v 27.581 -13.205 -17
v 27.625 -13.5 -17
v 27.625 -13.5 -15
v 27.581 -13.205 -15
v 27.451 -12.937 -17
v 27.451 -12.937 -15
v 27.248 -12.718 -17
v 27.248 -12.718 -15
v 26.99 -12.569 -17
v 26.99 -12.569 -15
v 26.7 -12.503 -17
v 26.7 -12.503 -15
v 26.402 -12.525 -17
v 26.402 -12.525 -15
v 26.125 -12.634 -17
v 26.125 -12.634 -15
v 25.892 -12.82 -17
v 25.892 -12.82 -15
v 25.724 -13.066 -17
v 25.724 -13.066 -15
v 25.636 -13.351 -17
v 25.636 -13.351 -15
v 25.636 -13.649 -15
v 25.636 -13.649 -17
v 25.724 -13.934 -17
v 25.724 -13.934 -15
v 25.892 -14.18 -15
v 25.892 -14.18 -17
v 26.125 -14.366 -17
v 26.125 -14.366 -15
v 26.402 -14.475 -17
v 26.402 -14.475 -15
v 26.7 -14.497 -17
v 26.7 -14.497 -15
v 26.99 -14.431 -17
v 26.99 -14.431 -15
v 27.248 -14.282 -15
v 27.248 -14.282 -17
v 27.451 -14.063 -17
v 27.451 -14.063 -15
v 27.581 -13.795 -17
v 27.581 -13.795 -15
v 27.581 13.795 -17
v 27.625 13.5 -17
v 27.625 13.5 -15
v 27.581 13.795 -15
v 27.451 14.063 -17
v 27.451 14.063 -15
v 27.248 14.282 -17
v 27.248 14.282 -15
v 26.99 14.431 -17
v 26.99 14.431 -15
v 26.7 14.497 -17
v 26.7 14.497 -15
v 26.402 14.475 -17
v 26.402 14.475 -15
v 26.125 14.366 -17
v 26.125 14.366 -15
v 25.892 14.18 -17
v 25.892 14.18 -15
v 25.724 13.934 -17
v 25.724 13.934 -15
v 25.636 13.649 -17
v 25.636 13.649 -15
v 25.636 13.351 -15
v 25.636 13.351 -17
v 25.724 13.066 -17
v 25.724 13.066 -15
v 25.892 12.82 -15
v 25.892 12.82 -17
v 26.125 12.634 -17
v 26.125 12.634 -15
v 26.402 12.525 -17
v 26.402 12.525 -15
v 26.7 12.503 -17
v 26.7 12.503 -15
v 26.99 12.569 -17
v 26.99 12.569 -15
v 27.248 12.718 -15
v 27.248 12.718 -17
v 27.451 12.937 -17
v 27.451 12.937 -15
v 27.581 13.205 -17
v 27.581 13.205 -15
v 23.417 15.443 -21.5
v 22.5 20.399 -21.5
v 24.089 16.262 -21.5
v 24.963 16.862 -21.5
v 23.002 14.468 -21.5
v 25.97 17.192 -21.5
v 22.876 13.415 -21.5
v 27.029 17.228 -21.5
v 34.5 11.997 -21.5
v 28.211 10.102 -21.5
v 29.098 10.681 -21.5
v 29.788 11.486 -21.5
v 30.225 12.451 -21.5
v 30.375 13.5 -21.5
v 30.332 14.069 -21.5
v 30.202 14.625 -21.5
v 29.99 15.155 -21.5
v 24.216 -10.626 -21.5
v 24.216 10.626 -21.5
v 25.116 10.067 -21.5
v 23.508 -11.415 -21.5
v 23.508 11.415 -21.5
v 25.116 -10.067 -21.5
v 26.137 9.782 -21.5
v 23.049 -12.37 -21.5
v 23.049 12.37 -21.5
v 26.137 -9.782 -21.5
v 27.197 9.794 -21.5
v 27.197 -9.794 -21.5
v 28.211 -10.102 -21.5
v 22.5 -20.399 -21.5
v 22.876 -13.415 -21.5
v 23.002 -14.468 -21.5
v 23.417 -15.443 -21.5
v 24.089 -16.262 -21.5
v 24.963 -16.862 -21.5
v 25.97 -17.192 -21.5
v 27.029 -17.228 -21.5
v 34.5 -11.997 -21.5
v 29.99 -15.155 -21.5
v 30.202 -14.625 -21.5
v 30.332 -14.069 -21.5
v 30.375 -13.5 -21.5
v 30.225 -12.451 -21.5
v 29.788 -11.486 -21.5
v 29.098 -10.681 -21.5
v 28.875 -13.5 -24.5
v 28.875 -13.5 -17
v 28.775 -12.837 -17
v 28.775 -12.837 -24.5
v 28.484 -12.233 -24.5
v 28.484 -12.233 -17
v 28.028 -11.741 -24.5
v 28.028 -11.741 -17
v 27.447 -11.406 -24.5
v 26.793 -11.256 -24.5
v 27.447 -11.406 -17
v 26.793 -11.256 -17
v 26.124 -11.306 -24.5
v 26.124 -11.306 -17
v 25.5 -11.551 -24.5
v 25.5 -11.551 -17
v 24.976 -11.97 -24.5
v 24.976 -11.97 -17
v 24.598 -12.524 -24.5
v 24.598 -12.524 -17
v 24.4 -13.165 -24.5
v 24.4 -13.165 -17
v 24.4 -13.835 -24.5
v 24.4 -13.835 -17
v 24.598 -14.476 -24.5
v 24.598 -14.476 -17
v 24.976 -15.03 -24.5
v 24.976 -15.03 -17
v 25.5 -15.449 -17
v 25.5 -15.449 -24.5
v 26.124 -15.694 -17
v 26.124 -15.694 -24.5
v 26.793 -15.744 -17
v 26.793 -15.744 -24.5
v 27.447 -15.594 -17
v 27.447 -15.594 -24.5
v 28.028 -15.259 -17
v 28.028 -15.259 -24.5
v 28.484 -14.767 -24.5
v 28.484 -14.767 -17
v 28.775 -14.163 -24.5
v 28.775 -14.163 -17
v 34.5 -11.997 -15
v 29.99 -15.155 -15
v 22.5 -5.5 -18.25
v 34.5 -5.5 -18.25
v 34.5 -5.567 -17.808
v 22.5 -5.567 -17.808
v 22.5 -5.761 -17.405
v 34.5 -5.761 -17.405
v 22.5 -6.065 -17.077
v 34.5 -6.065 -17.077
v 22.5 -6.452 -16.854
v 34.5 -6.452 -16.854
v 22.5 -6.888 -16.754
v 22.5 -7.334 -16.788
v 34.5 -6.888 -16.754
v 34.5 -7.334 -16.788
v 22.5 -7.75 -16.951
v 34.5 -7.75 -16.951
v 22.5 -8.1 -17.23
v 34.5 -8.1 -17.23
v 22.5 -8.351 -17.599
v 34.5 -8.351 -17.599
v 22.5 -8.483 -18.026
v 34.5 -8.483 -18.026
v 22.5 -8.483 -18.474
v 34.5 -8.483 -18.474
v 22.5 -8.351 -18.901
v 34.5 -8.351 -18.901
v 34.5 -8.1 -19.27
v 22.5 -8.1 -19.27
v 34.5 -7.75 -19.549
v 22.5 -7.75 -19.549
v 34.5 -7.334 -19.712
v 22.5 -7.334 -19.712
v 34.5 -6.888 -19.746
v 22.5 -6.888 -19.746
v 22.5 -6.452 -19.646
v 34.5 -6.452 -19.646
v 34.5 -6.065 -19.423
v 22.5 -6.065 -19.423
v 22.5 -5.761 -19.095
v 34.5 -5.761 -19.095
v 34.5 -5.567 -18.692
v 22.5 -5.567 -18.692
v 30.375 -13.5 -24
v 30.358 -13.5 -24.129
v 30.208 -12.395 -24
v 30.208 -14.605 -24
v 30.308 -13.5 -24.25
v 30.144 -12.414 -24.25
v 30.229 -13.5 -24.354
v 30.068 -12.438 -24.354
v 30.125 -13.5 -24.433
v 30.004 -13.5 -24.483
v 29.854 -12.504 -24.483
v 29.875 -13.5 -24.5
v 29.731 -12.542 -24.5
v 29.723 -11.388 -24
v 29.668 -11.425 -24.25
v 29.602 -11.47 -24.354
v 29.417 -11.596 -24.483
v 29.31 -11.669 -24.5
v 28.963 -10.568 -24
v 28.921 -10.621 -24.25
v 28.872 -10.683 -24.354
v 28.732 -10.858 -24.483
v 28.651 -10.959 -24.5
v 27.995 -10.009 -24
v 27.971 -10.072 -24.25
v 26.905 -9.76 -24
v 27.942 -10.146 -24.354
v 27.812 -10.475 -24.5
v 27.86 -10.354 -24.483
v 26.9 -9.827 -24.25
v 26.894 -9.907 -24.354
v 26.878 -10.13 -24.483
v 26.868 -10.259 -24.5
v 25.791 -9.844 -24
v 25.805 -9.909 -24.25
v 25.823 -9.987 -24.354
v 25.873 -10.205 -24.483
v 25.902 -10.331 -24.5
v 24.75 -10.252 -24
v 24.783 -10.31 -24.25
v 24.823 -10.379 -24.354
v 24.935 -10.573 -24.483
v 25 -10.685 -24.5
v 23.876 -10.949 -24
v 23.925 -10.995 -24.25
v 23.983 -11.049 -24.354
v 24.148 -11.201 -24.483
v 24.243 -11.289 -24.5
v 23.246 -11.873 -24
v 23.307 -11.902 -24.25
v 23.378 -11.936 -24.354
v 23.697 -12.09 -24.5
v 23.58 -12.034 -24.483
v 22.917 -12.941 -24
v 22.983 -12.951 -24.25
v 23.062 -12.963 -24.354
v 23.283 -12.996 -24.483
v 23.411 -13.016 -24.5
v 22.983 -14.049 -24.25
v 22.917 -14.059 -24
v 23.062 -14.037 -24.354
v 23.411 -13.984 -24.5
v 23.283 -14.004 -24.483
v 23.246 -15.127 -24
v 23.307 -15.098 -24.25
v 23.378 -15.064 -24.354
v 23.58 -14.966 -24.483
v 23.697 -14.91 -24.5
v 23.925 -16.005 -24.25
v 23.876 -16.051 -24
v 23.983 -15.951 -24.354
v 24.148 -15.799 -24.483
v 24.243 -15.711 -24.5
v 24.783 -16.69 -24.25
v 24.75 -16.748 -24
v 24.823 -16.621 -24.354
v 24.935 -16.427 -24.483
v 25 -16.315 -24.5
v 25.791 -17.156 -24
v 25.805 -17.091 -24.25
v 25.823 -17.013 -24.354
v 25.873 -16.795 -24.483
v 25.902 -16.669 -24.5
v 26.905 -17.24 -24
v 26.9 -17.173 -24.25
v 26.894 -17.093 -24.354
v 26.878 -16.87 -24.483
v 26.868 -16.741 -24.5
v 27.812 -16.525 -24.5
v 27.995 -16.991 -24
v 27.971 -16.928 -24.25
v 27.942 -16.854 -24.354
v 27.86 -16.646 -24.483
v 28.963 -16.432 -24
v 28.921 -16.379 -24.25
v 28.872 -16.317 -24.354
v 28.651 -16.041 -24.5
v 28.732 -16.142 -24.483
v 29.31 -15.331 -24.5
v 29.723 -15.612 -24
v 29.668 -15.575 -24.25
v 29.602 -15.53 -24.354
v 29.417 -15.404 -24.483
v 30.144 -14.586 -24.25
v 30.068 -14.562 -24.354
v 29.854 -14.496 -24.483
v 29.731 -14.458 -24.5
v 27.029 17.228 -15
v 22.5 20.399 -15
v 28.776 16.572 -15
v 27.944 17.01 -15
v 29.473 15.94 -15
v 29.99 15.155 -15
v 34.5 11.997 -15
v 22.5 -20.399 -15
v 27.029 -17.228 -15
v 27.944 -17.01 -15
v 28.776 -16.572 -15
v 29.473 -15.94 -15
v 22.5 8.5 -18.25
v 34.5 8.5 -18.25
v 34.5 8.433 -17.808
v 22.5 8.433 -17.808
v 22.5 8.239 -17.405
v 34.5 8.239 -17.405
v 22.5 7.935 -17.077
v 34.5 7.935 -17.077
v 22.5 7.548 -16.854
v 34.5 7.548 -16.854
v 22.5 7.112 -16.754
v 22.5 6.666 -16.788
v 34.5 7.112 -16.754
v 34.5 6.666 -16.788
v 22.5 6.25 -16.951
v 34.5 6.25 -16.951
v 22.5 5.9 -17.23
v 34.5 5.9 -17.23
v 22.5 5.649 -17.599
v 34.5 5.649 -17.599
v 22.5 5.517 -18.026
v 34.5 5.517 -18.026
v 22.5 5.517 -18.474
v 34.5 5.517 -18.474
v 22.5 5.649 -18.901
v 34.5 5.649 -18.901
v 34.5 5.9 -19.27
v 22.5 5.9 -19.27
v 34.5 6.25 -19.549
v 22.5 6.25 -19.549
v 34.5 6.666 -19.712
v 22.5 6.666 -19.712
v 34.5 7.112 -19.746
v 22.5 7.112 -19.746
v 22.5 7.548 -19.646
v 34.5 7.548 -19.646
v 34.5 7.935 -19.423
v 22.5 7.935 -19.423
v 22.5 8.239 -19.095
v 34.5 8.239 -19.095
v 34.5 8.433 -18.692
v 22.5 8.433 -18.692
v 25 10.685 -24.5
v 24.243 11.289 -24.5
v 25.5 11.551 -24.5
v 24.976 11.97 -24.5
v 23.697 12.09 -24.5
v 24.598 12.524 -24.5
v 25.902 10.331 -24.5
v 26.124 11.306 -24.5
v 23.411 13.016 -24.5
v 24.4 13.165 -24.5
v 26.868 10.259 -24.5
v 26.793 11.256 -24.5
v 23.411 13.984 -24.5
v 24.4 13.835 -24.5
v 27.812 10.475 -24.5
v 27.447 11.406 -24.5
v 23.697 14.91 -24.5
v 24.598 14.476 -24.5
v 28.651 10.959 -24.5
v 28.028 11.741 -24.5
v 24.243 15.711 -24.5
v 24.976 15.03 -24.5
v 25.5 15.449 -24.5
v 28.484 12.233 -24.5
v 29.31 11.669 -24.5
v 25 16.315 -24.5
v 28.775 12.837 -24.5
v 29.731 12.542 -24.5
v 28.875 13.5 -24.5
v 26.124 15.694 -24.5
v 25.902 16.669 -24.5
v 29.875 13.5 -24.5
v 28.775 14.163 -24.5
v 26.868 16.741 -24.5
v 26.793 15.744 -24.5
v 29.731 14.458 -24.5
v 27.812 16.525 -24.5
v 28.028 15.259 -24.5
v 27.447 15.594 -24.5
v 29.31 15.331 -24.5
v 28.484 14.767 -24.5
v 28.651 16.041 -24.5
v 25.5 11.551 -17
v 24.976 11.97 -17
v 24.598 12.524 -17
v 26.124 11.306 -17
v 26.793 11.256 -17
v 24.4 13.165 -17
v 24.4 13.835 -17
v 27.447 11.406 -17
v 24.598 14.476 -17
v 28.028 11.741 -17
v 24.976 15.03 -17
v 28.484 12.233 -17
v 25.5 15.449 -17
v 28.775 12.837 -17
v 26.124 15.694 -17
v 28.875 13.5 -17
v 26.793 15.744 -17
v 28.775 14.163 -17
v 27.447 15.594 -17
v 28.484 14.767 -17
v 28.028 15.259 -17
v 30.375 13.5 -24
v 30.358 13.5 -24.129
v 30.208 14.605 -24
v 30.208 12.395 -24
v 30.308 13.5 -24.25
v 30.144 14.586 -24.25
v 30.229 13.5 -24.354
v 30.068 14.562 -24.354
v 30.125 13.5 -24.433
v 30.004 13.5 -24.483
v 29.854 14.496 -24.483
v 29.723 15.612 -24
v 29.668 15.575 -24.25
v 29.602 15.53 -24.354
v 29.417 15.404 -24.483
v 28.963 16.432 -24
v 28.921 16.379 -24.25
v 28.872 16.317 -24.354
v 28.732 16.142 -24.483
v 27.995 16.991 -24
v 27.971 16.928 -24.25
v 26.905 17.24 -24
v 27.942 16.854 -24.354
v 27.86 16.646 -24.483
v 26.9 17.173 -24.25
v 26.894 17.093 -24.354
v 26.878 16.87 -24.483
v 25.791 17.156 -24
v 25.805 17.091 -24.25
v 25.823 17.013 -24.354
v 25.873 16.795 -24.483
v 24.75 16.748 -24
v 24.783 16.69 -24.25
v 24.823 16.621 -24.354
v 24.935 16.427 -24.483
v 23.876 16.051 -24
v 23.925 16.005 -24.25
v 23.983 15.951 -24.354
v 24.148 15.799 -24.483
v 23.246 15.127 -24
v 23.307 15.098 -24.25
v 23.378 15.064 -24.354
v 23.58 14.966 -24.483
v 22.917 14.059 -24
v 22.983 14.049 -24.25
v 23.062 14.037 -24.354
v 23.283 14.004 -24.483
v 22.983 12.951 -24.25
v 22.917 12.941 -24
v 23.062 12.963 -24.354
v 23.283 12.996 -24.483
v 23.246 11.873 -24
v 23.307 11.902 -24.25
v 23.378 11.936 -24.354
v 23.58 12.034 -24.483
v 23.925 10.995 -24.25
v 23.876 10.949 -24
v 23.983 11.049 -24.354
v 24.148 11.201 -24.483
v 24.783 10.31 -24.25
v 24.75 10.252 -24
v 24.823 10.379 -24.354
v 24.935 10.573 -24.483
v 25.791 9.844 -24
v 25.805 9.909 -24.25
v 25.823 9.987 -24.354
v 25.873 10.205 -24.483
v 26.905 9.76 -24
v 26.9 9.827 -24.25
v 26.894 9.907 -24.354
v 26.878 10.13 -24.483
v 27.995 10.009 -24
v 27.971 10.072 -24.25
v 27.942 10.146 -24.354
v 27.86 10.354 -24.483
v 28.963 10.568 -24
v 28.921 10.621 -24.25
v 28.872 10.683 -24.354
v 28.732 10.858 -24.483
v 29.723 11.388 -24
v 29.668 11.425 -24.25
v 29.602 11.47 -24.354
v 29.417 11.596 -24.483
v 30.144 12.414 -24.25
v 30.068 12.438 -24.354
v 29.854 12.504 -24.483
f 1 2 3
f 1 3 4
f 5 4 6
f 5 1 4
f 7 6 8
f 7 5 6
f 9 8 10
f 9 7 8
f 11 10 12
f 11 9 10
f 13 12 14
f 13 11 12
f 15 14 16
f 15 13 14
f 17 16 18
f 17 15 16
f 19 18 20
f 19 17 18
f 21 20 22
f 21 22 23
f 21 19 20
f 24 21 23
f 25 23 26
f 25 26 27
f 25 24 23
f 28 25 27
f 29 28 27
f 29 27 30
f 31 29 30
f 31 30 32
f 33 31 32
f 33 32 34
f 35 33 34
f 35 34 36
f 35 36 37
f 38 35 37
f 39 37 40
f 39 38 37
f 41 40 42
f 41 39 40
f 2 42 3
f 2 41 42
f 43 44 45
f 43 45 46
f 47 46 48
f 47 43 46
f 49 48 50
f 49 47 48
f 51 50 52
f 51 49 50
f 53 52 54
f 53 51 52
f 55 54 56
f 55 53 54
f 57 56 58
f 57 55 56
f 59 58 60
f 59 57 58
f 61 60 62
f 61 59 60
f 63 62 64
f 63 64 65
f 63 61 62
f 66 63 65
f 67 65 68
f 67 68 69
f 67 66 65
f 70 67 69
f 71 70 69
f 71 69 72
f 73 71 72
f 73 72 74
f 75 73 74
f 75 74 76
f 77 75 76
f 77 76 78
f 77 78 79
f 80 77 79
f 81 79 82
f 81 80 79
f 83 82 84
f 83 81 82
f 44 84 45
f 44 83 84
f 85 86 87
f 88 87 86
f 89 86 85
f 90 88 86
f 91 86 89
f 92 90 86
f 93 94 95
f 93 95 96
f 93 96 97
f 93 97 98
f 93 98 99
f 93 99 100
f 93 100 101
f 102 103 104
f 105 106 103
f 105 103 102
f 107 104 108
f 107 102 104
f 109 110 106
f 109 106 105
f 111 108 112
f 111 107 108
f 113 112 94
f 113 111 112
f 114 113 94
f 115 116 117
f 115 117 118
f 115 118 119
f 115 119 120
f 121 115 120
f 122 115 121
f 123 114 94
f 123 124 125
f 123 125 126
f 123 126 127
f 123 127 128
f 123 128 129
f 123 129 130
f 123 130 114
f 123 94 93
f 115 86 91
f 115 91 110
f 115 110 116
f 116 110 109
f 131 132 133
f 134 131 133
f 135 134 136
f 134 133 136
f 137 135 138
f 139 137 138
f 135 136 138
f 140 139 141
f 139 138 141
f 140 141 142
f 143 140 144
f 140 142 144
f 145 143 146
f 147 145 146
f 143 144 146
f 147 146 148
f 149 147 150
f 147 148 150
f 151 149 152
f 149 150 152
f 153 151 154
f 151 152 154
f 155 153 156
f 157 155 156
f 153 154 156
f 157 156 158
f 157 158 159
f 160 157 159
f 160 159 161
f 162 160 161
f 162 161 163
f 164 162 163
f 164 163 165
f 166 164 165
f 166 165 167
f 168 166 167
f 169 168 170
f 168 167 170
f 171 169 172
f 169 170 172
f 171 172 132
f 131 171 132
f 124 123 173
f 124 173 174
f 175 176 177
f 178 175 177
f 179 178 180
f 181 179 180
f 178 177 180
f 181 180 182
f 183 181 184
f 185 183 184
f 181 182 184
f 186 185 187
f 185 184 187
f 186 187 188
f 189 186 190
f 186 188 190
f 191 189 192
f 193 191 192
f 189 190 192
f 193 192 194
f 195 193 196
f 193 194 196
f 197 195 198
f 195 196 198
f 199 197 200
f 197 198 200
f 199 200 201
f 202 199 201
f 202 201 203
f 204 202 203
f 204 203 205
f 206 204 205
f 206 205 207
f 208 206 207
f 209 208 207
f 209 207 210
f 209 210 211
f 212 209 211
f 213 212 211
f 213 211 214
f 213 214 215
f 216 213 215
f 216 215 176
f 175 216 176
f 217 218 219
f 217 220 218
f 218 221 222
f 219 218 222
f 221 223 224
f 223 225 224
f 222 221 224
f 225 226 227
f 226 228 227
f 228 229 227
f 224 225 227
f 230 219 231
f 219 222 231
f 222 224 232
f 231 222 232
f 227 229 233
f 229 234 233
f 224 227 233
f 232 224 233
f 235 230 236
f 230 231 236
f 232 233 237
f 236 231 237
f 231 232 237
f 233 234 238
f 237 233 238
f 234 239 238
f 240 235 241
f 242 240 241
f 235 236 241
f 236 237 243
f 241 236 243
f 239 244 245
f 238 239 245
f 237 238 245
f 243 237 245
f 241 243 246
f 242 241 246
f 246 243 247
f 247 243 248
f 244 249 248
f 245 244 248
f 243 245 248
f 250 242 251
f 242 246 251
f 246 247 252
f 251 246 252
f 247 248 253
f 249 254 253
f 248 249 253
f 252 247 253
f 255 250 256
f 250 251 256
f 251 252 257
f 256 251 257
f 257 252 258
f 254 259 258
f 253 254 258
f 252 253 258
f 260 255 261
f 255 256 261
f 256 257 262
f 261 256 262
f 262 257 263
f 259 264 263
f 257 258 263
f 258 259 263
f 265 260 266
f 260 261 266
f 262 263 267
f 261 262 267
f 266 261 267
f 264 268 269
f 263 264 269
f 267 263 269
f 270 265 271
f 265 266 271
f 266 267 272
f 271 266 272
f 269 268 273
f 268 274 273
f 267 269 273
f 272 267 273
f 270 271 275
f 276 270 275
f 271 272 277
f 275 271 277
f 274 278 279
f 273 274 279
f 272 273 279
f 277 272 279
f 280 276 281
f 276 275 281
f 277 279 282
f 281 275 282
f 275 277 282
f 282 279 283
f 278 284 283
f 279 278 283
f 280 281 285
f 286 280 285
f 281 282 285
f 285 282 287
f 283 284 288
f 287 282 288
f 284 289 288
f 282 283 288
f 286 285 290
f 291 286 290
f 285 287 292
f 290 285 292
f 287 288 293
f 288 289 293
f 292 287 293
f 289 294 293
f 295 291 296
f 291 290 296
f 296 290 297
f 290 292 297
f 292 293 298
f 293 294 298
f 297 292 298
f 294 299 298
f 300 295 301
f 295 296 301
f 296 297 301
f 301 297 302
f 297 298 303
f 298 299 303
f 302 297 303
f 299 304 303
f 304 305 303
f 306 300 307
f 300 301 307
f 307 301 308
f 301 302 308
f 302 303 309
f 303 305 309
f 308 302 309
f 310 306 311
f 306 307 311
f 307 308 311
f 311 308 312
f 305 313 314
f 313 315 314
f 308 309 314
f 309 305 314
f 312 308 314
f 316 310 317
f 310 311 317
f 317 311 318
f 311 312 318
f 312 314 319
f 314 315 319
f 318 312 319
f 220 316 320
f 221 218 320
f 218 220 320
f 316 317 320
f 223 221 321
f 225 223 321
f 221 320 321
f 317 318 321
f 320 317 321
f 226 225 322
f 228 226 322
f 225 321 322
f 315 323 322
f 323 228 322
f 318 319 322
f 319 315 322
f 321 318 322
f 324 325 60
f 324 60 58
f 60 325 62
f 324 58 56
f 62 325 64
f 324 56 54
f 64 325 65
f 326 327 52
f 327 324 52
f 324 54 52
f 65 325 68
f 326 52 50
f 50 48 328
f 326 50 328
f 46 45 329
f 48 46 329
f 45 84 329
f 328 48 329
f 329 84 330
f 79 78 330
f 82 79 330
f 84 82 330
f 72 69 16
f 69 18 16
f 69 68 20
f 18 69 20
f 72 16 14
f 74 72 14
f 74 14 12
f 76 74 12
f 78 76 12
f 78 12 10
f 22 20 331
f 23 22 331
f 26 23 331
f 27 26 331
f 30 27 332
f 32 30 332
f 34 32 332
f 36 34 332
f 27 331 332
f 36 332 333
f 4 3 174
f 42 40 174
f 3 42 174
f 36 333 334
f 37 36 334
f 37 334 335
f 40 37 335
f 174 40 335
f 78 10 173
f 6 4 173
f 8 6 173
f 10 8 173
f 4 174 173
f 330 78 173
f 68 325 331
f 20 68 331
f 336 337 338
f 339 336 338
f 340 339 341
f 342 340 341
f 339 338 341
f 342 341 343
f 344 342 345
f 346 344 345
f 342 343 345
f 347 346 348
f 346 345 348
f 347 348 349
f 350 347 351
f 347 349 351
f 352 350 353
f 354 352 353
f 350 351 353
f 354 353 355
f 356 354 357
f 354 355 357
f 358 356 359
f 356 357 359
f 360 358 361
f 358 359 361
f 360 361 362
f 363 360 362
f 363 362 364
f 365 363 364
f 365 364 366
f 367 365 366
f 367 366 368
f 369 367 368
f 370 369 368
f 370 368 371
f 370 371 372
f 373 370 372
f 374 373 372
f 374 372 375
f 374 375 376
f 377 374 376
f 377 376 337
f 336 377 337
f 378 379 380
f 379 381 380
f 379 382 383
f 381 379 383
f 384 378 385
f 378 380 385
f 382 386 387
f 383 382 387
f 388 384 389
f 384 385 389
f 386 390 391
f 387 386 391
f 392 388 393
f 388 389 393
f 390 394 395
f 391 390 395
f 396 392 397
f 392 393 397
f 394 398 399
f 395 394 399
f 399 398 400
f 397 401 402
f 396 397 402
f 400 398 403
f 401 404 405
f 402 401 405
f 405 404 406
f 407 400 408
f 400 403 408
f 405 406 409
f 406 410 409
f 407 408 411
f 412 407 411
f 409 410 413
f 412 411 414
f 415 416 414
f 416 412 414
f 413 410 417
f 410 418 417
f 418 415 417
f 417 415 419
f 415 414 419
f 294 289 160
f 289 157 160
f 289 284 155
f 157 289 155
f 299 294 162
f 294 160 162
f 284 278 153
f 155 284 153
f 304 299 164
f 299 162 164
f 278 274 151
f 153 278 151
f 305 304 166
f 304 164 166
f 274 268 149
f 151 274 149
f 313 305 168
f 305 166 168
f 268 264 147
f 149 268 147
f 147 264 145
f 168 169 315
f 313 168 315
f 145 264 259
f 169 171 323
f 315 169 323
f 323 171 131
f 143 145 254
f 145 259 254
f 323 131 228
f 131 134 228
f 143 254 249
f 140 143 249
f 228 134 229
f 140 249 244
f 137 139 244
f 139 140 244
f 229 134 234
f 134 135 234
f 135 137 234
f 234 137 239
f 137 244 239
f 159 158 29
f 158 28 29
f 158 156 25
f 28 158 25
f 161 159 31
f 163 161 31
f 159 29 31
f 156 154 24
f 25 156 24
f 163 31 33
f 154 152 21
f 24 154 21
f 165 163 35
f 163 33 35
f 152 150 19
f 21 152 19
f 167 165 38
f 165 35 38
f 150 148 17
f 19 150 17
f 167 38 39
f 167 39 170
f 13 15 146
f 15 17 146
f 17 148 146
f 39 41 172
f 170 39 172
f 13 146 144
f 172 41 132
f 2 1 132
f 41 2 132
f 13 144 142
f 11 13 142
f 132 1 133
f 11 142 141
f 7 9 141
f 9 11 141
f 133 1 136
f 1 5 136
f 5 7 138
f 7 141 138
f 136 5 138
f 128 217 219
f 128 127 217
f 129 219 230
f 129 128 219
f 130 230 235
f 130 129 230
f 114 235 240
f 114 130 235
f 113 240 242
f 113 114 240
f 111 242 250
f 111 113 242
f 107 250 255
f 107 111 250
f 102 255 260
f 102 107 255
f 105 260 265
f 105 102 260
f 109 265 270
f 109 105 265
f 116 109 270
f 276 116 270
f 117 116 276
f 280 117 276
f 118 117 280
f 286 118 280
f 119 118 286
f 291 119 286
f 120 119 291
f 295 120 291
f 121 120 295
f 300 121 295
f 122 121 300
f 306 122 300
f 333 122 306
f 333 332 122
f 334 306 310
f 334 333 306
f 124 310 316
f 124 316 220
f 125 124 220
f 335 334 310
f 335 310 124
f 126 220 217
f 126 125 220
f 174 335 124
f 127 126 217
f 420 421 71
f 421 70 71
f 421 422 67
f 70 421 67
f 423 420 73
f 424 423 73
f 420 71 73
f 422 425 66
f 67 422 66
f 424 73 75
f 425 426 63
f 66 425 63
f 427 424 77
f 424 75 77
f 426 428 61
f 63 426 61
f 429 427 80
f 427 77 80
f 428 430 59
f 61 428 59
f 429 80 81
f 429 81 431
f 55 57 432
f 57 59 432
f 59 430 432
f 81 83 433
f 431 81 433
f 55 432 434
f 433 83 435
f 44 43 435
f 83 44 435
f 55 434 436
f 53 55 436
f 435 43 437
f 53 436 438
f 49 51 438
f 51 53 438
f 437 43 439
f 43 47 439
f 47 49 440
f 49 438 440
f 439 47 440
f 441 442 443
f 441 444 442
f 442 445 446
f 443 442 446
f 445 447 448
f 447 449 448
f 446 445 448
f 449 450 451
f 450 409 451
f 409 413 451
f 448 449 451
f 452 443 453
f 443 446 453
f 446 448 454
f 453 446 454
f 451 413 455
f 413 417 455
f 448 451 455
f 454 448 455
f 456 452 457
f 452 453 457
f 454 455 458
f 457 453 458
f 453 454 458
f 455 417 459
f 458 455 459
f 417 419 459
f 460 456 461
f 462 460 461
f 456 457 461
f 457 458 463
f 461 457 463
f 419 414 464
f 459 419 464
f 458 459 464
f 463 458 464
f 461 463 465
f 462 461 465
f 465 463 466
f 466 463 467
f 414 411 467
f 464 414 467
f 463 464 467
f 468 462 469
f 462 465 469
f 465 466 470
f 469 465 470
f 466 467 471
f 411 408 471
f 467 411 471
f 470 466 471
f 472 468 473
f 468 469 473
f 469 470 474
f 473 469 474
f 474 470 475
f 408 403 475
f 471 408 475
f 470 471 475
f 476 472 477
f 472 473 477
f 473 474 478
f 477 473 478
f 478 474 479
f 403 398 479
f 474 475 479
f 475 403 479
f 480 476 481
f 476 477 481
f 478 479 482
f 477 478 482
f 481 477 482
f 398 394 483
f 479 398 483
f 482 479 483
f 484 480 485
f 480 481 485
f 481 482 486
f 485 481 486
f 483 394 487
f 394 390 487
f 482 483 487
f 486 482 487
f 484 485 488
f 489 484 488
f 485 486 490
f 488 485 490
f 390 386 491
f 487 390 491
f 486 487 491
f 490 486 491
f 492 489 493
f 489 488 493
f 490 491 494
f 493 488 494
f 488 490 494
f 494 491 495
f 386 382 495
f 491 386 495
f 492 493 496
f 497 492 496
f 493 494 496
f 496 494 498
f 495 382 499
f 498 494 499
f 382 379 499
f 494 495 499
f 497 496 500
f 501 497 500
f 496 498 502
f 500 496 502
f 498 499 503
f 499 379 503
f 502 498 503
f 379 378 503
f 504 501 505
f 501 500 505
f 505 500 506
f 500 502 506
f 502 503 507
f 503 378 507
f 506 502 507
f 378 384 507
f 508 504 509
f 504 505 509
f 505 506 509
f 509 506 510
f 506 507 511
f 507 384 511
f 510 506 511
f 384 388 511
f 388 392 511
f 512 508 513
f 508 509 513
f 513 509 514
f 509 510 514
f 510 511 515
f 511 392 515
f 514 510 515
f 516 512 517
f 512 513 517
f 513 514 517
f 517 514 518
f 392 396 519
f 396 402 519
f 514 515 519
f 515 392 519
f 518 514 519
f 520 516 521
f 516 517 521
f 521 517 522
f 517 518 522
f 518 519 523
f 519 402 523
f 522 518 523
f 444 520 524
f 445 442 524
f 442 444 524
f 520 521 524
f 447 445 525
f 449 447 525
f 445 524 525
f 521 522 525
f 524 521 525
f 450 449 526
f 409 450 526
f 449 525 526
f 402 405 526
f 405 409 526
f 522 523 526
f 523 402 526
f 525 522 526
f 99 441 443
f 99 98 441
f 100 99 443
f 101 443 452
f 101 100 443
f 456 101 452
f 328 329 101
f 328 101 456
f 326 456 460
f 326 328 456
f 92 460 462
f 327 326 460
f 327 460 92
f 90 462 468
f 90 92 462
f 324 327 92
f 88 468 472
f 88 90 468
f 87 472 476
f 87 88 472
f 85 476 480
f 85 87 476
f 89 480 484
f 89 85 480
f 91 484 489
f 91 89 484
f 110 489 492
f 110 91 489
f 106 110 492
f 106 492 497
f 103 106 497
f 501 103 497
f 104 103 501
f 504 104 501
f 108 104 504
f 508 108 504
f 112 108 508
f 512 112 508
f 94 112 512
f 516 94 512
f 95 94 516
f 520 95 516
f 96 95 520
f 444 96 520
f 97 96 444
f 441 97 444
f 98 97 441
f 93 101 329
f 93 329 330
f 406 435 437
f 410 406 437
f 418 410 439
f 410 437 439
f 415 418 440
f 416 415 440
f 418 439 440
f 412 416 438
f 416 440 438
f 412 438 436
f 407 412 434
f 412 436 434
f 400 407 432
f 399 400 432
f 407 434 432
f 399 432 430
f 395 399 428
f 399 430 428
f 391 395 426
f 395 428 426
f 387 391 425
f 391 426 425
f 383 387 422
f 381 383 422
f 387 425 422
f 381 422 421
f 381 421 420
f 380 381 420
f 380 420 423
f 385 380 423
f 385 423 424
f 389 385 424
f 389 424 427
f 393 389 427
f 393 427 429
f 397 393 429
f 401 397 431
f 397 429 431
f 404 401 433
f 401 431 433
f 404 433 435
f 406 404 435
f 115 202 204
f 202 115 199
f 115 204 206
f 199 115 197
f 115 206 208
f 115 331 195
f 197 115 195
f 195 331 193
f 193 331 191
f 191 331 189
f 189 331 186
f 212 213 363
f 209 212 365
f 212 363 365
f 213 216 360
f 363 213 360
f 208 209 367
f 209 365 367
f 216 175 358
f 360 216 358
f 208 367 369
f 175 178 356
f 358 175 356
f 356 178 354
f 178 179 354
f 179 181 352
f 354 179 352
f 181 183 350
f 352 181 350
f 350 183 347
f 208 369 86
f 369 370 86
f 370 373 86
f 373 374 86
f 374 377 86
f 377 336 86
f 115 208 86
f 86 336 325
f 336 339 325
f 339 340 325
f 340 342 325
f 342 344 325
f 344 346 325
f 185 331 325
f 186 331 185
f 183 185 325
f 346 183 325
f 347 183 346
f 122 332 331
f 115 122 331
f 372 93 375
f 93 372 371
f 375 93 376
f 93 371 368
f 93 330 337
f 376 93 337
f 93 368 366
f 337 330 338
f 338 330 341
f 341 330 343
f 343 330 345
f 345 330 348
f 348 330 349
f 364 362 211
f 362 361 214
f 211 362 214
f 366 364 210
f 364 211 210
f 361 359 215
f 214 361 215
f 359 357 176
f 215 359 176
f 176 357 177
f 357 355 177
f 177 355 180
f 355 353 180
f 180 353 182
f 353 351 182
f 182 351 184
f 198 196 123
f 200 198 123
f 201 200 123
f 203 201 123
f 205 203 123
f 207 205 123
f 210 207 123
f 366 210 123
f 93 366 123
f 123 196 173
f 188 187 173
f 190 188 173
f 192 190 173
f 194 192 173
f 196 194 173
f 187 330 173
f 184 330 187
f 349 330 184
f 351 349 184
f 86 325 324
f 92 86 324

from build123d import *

# Parameters (mm, degrees)
SKETCH044_R           = 1.5
EXTRUDE033_DEPTH      = 100
SKETCH047_R           = 2.25
EXTRUDE036_DEPTH      = 7.5
SKETCH046_R           = 1
EXTRUDE035_DEPTH      = 2
EXTRUDE034_DEPTH      = 6.5
SKETCH043_R           = 3.75
EXTRUDE032_DEPTH      = 5
EXTRUDE032_DEPTH_BACK = 4.5
FILLET019_R           = 0.5


with BuildPart() as extrude033:
    # Sketch044 → Extrude033 (new body)
    with BuildSketch(Plane.YZ.offset(34.5)):
        with Locations((-7, -18.25)):
            Circle(SKETCH044_R)
        with Locations((7, -18.25)):
            Circle(SKETCH044_R)
    extrude(amount=-EXTRUDE033_DEPTH)


with BuildPart() as extrude036:
    # Sketch047 → Extrude036 (new body)
    with BuildSketch(Plane.XY.offset(-20)):
        with Locations((26.625, 13.5)):
            Circle(SKETCH047_R)
        with Locations((26.625, -13.5)):
            Circle(SKETCH047_R)
    extrude(amount=-EXTRUDE036_DEPTH)


with BuildPart() as extrude036_1:
    # Extrude036 placement: moved
    add(extrude036.part.moved(Location((0, 0, 3))))


with BuildPart() as fusion015:
    # Sketch046 → Extrude035 (new body)
    with BuildSketch(Plane.XY.offset(-20)):
        with Locations((26.625, 13.5)):
            Circle(SKETCH046_R)
        with Locations((26.625, -13.5)):
            Circle(SKETCH046_R)
    extrude(amount=EXTRUDE035_DEPTH)


with BuildPart() as fusion015_1:
    # Extrude035 placement: moved
    add(fusion015.part.moved(Location((0, 0, 3))))

    # Fusion015: union Extrude036
    add(extrude036_1.part)


with BuildPart() as extrude034:
    # Sketch045 → Extrude034 (new body)
    with BuildSketch(Plane(origin=(0, 0, -15), x_dir=(1, 0, 0), z_dir=(0, 0, -1))):
        Polygon((-22.5, 20.399377), (-22.5, -20.399423), (-34.5, -11.996933), (-34.5, 11.996887), align=None)
    extrude(amount=EXTRUDE034_DEPTH)


with BuildPart() as part_mirroring003:
    # Part__Mirroring003: instance of Extrude034
    add(extrude034.part.mirror(Plane(origin=(0, 0, 0), x_dir=(0, -1, 0), z_dir=(1, 0, 0))))


with BuildPart() as boden_tube_bracket_w_deep_fitting:
    # Sketch043 → Extrude032 (new body, two sides)
    with BuildSketch(Plane.XY.offset(-20)) as extrude032_sk:
        with Locations((26.625, 13.5)):
            Circle(SKETCH043_R)
        with Locations((26.625, -13.5)):
            Circle(SKETCH043_R)
    extrude(amount=EXTRUDE032_DEPTH)
    extrude(extrude032_sk.sketch, amount=-EXTRUDE032_DEPTH_BACK)

    # Fillet019
    fillet019_edges = [boden_tube_bracket_w_deep_fitting.edges().sort_by_distance(p)[0] for p in [
        (22.875, -13.5, -24.5),
        (22.875, 13.5, -24.5),
    ]]
    fillet(fillet019_edges, radius=FILLET019_R)

    # Fusion016: union Part__Mirroring003
    add(part_mirroring003.part)

    # Cut013: cut Fusion015
    add(fusion015_1.part, mode=Mode.SUBTRACT)

    # Cut014: cut Extrude033
    add(extrude033.part, mode=Mode.SUBTRACT)


solid = boden_tube_bracket_w_deep_fitting.part
